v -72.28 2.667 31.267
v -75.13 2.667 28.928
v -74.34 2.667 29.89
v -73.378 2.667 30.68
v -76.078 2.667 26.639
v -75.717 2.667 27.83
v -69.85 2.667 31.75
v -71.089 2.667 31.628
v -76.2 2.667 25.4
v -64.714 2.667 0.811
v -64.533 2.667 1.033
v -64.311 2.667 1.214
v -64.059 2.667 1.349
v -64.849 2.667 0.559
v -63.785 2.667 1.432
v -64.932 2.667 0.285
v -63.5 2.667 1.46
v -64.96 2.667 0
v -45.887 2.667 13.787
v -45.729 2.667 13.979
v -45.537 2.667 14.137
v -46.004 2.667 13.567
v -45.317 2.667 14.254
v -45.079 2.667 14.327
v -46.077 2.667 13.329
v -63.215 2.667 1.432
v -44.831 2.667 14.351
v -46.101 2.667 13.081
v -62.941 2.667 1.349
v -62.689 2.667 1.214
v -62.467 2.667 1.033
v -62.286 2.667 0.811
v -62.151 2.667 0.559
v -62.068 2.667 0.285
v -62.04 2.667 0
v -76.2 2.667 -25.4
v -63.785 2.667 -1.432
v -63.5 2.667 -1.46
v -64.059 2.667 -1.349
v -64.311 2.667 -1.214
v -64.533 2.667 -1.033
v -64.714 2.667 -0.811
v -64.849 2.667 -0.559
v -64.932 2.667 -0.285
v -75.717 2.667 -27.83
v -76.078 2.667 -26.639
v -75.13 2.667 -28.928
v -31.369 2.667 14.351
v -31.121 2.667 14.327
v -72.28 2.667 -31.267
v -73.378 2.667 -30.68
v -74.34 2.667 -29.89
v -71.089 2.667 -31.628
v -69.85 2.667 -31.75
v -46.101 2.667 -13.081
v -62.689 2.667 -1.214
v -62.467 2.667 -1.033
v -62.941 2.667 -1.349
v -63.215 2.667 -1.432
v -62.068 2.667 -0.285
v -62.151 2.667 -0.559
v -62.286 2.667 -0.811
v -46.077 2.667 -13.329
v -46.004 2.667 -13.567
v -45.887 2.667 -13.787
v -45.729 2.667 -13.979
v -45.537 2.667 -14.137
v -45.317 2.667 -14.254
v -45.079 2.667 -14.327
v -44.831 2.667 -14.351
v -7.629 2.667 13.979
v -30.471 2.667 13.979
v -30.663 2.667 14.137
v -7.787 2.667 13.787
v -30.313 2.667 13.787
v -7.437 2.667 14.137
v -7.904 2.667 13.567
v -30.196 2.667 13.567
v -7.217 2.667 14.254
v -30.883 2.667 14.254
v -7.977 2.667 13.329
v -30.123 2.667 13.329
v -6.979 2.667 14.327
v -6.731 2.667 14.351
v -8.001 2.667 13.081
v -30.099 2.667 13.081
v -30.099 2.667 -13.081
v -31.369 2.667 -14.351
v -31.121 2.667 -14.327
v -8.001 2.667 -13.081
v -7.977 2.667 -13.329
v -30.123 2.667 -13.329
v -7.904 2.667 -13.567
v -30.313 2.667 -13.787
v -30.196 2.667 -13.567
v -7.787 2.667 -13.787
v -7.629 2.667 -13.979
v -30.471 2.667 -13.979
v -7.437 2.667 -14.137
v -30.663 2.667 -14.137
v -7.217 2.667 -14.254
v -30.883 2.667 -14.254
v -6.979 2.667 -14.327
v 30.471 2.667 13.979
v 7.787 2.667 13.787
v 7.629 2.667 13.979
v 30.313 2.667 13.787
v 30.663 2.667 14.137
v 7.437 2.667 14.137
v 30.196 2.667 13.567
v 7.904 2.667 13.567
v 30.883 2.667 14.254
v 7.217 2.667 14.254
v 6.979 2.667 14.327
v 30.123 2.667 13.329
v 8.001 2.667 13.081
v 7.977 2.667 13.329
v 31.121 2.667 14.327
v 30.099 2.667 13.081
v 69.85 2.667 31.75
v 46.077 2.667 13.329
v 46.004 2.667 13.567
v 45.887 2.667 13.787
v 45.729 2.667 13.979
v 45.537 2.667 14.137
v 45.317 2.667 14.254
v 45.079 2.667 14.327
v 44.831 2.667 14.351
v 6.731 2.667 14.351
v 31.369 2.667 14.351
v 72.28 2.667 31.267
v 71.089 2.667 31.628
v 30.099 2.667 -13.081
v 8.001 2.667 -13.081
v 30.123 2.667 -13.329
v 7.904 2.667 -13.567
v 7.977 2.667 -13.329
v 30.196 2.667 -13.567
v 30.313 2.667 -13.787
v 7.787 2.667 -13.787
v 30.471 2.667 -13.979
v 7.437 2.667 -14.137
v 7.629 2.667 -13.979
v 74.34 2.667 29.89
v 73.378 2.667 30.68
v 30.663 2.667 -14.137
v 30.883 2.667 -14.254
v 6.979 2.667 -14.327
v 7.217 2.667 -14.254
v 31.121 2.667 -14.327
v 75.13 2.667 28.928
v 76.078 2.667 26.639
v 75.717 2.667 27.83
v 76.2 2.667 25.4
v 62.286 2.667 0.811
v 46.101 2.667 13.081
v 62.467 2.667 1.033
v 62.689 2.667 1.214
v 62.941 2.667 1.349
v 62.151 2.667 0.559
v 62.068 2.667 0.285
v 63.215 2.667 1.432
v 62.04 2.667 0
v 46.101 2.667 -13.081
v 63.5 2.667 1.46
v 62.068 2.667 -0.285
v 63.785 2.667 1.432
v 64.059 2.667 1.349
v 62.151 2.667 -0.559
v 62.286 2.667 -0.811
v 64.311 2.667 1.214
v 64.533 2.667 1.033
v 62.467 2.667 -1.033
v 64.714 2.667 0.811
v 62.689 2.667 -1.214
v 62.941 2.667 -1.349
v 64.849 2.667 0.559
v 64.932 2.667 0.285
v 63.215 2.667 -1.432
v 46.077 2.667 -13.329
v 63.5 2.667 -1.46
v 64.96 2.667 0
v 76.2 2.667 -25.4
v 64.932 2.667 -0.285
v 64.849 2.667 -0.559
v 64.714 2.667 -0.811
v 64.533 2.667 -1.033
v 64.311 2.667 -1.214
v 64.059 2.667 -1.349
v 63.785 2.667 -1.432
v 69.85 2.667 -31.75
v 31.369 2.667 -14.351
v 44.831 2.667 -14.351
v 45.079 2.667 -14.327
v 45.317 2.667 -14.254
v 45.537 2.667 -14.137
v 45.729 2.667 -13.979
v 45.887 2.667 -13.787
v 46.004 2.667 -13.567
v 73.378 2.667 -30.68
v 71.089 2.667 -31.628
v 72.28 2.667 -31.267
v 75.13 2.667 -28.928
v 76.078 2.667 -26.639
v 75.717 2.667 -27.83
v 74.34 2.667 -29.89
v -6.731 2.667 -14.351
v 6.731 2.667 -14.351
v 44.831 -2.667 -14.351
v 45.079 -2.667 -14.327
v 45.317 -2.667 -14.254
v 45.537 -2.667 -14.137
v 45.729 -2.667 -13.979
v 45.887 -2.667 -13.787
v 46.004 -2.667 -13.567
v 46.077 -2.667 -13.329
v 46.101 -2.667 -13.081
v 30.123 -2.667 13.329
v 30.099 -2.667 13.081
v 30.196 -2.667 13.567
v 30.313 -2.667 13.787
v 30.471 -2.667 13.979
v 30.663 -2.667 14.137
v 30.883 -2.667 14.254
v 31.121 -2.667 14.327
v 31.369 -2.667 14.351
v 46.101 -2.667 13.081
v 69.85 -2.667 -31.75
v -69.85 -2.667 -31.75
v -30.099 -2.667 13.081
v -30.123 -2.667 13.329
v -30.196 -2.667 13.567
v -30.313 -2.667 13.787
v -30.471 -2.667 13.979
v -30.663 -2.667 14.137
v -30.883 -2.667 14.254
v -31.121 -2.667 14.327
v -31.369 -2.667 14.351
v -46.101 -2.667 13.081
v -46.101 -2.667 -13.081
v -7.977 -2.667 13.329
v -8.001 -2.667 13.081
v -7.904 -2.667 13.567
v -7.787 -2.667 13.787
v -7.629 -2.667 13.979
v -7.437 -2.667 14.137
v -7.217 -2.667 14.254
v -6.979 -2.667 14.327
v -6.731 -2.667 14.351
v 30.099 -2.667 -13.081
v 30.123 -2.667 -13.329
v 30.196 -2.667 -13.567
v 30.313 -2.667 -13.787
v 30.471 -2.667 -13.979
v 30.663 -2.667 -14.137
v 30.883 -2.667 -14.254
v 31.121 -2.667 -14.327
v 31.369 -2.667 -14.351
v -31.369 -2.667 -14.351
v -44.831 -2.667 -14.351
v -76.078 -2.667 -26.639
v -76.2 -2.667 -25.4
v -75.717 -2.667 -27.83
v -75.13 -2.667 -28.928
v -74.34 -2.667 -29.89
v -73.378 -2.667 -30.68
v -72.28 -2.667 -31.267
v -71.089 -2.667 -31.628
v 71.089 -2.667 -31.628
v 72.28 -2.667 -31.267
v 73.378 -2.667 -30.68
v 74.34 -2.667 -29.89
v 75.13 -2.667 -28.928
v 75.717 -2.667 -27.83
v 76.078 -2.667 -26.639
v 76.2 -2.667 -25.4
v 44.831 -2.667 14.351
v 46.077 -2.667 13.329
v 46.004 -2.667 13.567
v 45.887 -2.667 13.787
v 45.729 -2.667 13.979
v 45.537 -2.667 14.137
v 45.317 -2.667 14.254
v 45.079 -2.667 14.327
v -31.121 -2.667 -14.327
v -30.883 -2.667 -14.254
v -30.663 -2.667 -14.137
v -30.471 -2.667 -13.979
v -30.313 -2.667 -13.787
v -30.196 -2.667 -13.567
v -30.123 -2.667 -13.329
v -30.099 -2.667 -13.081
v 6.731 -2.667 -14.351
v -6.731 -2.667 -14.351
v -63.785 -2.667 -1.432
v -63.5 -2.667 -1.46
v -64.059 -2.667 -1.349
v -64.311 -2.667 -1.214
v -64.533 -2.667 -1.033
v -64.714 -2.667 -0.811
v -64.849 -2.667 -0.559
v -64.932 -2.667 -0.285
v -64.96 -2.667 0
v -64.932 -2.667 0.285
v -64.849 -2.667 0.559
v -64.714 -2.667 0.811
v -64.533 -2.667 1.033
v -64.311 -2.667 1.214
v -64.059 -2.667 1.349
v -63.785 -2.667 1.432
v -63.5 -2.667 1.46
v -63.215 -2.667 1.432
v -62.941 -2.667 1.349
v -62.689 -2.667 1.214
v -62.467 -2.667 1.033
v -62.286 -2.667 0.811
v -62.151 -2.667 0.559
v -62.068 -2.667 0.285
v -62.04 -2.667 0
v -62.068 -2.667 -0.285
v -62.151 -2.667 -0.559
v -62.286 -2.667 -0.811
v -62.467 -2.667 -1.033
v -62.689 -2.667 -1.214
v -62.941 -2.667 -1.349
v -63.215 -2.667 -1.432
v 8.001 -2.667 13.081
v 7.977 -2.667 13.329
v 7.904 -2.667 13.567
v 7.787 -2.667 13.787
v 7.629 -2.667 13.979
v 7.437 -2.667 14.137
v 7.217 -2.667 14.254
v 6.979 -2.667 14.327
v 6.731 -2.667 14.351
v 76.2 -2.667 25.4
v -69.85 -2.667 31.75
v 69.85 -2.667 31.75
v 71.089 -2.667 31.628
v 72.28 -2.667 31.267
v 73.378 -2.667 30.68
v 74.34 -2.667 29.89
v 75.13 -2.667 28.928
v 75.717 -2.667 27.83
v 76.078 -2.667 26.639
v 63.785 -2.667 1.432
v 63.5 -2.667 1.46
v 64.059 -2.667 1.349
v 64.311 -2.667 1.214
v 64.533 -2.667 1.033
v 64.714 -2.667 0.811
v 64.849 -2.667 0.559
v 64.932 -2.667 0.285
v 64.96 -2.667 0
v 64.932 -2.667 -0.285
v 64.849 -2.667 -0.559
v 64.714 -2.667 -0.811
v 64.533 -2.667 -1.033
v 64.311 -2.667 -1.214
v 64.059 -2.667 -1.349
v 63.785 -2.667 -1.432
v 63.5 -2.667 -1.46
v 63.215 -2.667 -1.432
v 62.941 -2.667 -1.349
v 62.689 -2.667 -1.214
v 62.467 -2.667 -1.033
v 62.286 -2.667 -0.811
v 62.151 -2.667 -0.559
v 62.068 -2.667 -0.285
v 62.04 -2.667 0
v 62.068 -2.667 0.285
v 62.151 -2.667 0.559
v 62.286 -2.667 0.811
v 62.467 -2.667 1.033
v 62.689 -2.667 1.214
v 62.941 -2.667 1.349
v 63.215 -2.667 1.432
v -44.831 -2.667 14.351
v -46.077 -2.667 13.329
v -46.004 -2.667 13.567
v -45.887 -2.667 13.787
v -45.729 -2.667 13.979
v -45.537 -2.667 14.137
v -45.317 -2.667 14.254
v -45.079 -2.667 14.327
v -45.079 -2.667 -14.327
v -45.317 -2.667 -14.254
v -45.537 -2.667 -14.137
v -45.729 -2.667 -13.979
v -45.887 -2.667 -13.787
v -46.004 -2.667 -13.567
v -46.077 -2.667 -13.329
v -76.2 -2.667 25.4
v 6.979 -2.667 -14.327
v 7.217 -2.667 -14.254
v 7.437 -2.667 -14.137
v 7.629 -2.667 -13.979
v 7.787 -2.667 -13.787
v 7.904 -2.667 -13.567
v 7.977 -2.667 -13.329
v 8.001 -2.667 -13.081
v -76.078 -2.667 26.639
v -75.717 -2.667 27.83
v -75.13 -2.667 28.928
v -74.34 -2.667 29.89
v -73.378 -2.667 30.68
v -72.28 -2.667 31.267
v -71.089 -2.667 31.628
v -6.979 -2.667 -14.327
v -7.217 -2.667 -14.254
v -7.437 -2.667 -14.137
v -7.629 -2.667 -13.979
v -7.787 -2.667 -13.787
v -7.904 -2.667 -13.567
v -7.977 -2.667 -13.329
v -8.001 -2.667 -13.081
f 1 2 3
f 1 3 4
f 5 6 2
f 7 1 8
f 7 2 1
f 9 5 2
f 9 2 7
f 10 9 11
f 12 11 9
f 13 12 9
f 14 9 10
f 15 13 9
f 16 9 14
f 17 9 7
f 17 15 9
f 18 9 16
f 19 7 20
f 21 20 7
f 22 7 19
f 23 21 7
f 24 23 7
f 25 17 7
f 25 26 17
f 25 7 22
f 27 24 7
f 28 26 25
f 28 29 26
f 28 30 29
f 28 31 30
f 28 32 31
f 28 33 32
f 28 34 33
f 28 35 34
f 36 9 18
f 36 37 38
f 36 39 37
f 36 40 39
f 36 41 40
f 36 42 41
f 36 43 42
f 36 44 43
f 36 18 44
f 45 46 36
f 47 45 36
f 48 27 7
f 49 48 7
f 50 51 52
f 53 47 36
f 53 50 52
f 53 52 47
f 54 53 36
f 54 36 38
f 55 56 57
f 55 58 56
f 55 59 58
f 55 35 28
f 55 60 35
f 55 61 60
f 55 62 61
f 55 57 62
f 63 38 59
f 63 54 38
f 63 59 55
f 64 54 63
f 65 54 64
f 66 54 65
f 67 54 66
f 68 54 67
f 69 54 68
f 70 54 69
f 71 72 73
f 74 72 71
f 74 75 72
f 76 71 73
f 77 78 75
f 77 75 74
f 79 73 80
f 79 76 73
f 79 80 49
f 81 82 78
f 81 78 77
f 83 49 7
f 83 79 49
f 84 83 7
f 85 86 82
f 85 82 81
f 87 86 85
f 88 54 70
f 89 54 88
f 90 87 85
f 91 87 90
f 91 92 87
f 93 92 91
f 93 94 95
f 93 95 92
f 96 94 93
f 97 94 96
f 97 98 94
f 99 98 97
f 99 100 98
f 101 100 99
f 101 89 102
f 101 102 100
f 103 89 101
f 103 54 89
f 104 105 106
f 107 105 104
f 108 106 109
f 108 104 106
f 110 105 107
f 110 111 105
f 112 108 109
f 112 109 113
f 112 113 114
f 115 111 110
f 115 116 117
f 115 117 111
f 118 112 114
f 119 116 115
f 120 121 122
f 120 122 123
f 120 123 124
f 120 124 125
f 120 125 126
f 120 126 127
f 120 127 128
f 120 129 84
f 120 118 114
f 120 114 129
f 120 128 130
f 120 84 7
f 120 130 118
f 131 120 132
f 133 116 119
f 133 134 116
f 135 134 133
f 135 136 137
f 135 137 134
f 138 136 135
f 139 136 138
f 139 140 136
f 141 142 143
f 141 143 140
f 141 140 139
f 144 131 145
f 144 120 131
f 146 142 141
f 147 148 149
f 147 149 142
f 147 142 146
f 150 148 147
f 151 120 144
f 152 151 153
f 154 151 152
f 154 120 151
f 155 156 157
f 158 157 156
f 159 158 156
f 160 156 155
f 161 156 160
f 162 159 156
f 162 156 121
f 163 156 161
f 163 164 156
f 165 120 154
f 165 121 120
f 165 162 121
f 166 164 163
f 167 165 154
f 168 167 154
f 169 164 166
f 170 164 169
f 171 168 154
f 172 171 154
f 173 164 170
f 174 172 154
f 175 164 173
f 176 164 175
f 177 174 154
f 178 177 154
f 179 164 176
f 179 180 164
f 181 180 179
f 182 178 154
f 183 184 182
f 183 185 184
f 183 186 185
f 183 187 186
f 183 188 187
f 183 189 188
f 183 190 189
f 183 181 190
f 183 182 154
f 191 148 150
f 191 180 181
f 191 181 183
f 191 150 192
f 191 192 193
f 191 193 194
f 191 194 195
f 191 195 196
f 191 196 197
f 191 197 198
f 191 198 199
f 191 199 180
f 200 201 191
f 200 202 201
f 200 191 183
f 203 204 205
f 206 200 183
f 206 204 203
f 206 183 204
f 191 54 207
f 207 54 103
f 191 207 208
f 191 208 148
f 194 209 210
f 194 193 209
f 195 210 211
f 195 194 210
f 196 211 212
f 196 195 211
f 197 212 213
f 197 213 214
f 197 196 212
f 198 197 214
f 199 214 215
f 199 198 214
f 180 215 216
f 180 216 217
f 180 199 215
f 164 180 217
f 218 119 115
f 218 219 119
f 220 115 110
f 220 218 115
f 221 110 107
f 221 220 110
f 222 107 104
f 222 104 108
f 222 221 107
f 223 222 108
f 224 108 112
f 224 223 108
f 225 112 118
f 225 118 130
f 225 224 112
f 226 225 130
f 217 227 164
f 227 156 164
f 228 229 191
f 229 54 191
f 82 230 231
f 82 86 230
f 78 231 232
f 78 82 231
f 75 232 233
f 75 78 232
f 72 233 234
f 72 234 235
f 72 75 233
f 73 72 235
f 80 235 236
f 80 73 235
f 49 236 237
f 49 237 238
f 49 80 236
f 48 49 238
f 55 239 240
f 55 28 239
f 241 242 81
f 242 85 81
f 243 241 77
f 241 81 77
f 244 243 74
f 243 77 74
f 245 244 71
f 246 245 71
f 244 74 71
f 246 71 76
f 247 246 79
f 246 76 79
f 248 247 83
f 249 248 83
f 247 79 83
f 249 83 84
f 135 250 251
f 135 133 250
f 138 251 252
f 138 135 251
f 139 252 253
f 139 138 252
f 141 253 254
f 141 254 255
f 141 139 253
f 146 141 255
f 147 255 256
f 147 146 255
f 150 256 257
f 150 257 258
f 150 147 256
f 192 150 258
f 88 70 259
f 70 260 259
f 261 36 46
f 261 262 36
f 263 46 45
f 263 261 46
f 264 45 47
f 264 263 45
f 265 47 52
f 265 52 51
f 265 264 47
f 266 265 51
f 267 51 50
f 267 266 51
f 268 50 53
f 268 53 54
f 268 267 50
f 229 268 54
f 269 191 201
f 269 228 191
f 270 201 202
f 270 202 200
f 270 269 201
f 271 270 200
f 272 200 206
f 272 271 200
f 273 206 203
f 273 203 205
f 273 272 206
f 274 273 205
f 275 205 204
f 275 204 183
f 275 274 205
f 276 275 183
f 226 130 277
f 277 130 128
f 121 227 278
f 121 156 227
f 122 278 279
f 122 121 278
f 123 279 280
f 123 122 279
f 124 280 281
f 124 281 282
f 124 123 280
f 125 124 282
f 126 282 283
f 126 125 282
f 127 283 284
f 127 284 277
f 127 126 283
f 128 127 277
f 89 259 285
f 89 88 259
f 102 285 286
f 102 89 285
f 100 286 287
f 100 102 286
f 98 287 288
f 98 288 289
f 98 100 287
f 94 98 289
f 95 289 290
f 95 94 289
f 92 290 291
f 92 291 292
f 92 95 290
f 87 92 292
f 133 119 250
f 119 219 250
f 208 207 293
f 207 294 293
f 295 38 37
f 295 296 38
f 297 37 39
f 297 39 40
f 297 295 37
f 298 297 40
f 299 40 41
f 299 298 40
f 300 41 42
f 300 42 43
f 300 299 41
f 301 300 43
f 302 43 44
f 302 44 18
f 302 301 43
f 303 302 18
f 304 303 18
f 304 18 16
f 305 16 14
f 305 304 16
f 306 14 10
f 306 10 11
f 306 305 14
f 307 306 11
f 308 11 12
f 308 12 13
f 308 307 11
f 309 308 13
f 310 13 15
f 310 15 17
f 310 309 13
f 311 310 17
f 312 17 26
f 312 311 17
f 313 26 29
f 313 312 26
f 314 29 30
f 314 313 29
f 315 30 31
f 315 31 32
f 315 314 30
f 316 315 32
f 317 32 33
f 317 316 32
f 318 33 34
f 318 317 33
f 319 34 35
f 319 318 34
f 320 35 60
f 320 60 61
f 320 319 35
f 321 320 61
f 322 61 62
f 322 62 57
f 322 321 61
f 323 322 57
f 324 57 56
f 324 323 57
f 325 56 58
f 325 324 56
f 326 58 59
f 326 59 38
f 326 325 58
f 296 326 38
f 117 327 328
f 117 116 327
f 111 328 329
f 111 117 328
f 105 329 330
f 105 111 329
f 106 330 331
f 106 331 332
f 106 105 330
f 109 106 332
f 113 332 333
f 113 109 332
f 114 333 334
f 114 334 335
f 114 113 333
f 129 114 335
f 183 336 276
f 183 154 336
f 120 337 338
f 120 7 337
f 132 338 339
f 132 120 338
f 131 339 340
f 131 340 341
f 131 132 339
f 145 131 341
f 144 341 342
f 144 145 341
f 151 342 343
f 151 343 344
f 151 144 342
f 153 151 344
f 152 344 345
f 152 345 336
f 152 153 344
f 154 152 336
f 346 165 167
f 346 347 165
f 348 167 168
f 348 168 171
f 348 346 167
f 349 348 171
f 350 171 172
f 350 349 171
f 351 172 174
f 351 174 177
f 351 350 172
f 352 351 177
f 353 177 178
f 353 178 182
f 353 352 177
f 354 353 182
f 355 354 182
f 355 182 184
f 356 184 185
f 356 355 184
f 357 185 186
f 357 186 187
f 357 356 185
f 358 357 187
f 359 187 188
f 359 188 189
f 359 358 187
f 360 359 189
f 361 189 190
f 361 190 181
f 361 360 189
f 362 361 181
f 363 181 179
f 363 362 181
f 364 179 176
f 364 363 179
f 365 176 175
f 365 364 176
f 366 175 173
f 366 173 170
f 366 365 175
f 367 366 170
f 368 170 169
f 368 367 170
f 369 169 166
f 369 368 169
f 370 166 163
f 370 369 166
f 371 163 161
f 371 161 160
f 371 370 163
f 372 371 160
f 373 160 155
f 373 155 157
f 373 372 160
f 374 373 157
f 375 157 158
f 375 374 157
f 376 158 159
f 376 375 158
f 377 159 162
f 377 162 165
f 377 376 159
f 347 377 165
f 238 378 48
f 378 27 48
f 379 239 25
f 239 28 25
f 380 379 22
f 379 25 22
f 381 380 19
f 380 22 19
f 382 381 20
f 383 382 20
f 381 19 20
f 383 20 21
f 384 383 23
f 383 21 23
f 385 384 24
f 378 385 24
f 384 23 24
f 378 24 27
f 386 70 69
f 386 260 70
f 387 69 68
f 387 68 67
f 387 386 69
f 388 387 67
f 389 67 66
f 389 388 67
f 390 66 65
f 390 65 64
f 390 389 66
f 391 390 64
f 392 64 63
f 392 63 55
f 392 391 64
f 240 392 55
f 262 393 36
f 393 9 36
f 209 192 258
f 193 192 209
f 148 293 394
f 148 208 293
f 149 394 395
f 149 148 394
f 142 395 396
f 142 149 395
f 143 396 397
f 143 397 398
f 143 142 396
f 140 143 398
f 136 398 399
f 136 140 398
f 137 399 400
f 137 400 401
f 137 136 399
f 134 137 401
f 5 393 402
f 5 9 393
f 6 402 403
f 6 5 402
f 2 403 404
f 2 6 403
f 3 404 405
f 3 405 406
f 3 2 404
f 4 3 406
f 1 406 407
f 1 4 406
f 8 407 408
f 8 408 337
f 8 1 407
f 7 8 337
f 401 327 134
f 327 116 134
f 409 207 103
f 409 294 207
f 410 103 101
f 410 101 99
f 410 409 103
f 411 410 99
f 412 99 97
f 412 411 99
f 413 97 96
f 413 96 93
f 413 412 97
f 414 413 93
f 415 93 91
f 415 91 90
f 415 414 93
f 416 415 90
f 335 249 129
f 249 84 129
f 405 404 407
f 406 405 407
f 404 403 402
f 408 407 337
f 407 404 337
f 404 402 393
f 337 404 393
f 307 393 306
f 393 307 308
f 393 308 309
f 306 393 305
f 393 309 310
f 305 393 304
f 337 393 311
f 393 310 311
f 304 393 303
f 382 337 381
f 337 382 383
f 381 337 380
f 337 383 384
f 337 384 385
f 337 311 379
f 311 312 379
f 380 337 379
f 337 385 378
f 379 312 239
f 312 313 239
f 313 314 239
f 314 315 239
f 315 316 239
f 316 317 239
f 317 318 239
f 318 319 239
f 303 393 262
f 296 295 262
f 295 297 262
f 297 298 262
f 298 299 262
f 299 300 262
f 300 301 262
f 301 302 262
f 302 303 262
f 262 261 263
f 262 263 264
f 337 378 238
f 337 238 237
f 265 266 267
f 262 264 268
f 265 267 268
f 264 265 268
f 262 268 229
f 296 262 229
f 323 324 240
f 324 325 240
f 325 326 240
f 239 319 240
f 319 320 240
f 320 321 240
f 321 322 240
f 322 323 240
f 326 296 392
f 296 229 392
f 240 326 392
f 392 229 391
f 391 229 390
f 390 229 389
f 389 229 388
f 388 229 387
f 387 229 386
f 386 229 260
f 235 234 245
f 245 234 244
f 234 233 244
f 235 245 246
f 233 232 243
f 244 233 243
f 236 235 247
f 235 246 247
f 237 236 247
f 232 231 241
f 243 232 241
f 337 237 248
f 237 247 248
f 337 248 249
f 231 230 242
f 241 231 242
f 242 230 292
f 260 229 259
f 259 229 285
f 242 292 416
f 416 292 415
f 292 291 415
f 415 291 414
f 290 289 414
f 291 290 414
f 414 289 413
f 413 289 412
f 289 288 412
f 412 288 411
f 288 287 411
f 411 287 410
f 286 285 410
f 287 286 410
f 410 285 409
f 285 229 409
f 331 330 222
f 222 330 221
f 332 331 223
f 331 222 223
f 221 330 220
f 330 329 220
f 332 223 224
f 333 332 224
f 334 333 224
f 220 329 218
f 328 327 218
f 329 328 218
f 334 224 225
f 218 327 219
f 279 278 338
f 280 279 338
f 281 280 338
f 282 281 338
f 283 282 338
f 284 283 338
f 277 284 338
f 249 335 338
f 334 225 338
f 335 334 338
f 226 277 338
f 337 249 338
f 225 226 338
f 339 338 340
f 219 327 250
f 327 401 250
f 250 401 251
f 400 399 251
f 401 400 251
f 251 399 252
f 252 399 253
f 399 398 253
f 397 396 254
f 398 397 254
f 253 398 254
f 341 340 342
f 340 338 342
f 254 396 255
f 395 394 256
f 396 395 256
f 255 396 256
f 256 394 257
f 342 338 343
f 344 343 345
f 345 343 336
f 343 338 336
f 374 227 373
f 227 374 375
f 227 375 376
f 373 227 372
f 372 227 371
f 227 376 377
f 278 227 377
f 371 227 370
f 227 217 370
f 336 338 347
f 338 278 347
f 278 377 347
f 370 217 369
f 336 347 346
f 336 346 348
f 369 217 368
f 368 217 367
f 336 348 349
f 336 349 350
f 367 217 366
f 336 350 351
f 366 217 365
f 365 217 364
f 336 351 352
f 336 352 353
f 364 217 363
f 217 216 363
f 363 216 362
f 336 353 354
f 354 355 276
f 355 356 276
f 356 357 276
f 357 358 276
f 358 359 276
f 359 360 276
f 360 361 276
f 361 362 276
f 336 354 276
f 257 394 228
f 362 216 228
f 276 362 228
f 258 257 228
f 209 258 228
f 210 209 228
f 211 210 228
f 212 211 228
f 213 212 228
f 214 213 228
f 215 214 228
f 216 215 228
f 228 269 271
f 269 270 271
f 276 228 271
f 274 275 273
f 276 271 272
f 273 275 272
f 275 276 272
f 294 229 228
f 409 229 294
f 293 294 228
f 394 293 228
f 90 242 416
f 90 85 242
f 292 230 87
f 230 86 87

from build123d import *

# Parameters (mm, degrees)
SKETCH1_W           = 152.4
SKETCH1_H           = 63.5
SKETCH1_R           = 1.4605
SKETCH1_W_2         = 16.002
SKETCH1_H_2         = 28.702
BOSS_EXTRUDE1_DEPTH = 2.667
FILLET1_R           = 1.27
FILLET2_R           = 6.35


with BuildPart() as part:
    # Sketch1 → Boss-Extrude1 (new, symmetric)
    with BuildSketch(Plane(origin=(0, 0, 0), x_dir=(1, 0, 0), z_dir=(0, 1, 0))):
        Rectangle(SKETCH1_W, SKETCH1_H)
        with Locations(Location((63.5, 0, 0), (0, 0, 270))):
            Circle(SKETCH1_R, mode=Mode.SUBTRACT)
        with Locations(Location((-63.5, 0, 0), (0, 0, 90))):
            Circle(SKETCH1_R, mode=Mode.SUBTRACT)
        with Locations((-38.1, 0)):
            Rectangle(SKETCH1_W_2, SKETCH1_H_2, mode=Mode.SUBTRACT)
        Rectangle(SKETCH1_W_2, SKETCH1_H_2, mode=Mode.SUBTRACT)
        with Locations((38.1, 0)):
            Rectangle(SKETCH1_W_2, SKETCH1_H_2, mode=Mode.SUBTRACT)
    extrude(amount=BOSS_EXTRUDE1_DEPTH, both=True)

    # Fillet1
    fillet1_edges = [part.edges().sort_by_distance(p)[0] for p in [
        (-30.099, 0, 14.351),
        (-30.099, 0, -14.351),
        (-46.101, 0, -14.351),
        (-46.101, 0, 14.351),
        (8.001, 0, 14.351),
        (8.001, 0, -14.351),
        (-8.001, 0, -14.351),
        (-8.001, 0, 14.351),
        (46.101, 0, 14.351),
        (46.101, 0, -14.351),
        (30.099, 0, -14.351),
        (30.099, 0, 14.351),
    ]]
    fillet(fillet1_edges, radius=FILLET1_R)

    # Fillet2
    fillet2_edges = [part.edges().sort_by_distance(p)[0] for p in [
        (76.2, 0, 31.75),
        (-76.2, 0, 31.75),
        (-76.2, 0, -31.75),
        (76.2, 0, -31.75),
    ]]
    fillet(fillet2_edges, radius=FILLET2_R)


solid = part.part
